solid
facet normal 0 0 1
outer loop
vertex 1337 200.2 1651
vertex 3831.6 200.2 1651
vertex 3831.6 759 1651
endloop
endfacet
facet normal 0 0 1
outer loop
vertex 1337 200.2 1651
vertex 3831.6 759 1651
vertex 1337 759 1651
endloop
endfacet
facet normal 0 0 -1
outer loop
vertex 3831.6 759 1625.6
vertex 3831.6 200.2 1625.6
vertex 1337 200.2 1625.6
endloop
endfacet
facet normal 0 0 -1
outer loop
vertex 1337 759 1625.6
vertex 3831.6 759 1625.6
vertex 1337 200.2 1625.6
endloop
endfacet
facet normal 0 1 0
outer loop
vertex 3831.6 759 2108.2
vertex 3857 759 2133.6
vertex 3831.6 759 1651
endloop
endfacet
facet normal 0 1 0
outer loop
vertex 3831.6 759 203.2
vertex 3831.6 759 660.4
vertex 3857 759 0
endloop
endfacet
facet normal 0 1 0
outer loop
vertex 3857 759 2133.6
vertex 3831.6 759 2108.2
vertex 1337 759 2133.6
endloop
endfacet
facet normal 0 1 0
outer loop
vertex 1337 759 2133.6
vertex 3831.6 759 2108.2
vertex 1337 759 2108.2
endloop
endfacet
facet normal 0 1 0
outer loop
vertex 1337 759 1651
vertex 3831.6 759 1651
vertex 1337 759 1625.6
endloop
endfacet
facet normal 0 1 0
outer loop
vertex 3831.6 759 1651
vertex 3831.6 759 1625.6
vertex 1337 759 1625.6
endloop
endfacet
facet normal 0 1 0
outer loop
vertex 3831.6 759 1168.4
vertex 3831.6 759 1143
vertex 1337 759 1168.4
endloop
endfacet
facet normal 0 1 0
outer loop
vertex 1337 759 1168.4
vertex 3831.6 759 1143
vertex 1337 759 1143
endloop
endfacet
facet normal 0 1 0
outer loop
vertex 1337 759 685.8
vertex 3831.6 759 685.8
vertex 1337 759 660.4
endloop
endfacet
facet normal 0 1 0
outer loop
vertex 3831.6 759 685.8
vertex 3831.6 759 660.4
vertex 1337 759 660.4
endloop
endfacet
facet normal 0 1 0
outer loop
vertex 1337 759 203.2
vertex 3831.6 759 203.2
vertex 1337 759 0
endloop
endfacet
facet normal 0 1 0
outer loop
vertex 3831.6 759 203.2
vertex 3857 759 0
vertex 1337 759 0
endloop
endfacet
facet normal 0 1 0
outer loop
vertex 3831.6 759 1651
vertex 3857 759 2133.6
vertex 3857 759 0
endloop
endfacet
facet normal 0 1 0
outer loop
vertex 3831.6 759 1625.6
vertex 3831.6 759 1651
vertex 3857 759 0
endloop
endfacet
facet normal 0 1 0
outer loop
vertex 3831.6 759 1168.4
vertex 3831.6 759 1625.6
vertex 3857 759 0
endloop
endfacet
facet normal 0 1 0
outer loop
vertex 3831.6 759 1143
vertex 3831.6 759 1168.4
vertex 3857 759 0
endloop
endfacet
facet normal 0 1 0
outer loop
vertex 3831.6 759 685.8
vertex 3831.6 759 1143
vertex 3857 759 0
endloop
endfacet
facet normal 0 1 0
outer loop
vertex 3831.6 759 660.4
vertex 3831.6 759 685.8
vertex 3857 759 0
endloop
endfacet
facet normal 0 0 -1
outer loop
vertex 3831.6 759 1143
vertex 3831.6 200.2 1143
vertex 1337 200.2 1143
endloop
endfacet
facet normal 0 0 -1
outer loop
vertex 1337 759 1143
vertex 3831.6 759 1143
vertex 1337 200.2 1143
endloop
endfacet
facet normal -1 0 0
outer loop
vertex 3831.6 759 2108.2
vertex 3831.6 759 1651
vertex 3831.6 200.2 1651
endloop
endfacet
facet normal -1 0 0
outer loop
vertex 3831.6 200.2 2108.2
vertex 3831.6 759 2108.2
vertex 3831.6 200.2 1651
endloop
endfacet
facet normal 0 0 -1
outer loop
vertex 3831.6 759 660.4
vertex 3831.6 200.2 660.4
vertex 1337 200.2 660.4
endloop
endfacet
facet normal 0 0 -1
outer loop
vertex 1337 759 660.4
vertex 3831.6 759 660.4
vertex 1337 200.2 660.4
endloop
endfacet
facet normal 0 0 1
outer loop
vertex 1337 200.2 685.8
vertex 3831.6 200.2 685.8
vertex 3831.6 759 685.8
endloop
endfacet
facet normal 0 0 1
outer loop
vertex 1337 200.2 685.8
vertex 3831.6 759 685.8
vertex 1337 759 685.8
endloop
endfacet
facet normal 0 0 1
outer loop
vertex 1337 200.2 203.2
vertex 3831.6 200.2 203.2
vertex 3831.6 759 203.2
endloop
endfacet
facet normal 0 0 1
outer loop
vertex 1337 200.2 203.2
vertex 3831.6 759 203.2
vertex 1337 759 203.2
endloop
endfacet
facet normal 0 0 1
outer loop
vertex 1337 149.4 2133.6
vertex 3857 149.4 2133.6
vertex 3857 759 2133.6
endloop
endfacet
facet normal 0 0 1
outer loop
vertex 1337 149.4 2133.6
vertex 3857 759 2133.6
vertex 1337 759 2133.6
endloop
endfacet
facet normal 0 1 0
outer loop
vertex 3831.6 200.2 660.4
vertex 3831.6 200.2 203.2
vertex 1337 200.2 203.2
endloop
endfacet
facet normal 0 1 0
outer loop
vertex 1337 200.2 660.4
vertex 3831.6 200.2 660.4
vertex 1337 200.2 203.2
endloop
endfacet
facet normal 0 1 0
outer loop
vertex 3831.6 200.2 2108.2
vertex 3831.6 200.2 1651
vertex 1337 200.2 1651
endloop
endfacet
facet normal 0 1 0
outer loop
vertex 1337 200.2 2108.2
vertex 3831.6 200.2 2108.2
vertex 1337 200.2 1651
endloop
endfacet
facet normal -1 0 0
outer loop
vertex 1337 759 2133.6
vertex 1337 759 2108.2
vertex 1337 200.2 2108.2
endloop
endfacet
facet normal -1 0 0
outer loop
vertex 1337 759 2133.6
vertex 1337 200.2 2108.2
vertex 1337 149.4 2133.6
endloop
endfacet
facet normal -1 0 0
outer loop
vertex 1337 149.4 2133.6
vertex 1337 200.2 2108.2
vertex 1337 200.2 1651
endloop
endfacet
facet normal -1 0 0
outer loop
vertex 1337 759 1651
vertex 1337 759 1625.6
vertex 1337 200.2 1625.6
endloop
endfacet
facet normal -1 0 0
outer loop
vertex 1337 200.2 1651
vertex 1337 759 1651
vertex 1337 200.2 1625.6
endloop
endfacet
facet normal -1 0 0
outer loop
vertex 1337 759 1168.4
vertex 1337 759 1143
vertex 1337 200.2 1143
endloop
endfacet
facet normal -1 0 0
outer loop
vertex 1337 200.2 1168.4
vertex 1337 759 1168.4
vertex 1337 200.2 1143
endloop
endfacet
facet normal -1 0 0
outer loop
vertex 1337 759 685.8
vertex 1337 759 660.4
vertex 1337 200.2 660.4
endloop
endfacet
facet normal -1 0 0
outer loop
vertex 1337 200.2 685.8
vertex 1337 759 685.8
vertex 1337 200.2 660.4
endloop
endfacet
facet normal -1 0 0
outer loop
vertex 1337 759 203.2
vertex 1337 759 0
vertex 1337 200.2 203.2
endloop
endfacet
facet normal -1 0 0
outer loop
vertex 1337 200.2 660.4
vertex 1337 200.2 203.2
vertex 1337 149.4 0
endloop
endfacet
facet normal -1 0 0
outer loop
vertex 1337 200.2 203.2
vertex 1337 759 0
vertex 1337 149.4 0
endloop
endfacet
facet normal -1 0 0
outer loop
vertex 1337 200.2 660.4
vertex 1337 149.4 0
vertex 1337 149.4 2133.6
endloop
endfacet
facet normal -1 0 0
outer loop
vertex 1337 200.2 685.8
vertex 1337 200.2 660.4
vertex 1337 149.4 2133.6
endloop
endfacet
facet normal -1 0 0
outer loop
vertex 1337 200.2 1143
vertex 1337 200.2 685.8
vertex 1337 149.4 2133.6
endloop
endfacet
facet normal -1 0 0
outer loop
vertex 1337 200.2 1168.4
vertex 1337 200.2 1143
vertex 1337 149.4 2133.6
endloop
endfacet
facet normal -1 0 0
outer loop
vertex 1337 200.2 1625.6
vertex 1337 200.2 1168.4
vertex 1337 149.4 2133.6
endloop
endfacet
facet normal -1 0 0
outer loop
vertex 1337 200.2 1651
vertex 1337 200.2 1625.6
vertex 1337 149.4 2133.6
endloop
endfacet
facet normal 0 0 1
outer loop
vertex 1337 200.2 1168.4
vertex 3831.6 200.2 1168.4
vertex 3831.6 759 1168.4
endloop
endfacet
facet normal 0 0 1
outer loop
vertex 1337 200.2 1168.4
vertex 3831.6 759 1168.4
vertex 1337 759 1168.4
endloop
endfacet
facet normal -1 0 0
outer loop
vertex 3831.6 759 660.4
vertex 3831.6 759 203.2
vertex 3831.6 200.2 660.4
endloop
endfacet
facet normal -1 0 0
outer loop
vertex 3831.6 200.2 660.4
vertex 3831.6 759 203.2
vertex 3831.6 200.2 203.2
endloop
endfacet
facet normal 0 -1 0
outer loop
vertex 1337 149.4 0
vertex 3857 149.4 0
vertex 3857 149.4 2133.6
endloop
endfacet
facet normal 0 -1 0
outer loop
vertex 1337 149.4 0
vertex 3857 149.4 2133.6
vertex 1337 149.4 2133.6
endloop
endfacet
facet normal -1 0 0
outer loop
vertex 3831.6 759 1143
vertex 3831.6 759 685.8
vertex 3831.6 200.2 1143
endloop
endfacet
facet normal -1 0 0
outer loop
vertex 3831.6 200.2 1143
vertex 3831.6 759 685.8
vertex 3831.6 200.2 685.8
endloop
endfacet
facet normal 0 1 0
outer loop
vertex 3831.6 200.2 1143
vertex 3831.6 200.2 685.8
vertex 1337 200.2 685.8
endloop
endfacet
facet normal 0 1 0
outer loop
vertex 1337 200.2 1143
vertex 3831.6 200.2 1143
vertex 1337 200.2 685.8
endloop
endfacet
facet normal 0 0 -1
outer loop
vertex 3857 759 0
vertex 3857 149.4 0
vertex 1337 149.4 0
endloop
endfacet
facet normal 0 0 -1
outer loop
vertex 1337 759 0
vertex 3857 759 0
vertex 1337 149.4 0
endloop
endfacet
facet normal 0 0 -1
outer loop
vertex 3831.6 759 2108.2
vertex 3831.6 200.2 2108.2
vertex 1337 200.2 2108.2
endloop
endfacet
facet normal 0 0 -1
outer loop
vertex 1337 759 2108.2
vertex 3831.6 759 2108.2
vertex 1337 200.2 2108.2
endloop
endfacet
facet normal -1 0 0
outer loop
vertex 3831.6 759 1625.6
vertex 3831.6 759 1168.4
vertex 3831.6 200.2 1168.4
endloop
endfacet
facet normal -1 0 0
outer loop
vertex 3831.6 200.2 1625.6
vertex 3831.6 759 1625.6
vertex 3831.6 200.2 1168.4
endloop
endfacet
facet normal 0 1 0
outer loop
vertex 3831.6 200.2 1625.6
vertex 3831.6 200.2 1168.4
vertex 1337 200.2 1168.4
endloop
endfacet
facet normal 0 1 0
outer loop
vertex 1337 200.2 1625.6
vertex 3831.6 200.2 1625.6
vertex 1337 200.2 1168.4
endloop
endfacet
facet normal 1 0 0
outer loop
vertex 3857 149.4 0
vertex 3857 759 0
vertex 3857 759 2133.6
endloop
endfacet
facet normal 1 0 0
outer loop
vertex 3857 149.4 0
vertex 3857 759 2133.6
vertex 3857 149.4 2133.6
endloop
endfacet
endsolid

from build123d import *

# Parameters (mm, degrees)
BOX004_W               = 2500
BOX004_H               = 558.8
BOX004_DEPTH           = 457.2
BOX003_W               = 2500
BOX003_H               = 558.8
BOX003_DEPTH           = 457.2
BOX002_W               = 2500
BOX002_H               = 558.8
BOX002_DEPTH           = 457.2
BOX001_W               = 2500
BOX001_H               = 558.8
BOX001_DEPTH           = 457.2
BOX_W                  = 2520
BOX_H                  = 609.6
BOX_DEPTH              = 2133.6
CUT003_PLACEMENT_ANGLE = 180


with BuildPart() as cube004:
    # Box004 → Box004 (new body)
    with BuildSketch(Plane(origin=(25.4, 0, 1651), x_dir=(1, 0, 0), z_dir=(0, 0, 1))):
        with Locations((1250, 279.4)):
            Rectangle(BOX004_W, BOX004_H)
    extrude(amount=BOX004_DEPTH)


with BuildPart() as cube003:
    # Box003 → Box003 (new body)
    with BuildSketch(Plane(origin=(25.4, 0, 685.8), x_dir=(1, 0, 0), z_dir=(0, 0, 1))):
        with Locations((1250, 279.4)):
            Rectangle(BOX003_W, BOX003_H)
    extrude(amount=BOX003_DEPTH)


with BuildPart() as cube002:
    # Box002 → Box002 (new body)
    with BuildSketch(Plane(origin=(25.4, 0, 203.2), x_dir=(1, 0, 0), z_dir=(0, 0, 1))):
        with Locations((1250, 279.4)):
            Rectangle(BOX002_W, BOX002_H)
    extrude(amount=BOX002_DEPTH)


with BuildPart() as cube001:
    # Box001 → Box001 (new body)
    with BuildSketch(Plane(origin=(25.4, 0, 1168.4), x_dir=(1, 0, 0), z_dir=(0, 0, 1))):
        with Locations((1250, 279.4)):
            Rectangle(BOX001_W, BOX001_H)
    extrude(amount=BOX001_DEPTH)


with BuildPart() as cut003:
    # Box → Box (new body)
    with BuildSketch(Plane.XY):
        with Locations((1260, 304.8)):
            Rectangle(BOX_W, BOX_H)
    extrude(amount=BOX_DEPTH)

    # Cut: cut Cube001
    add(cube001.part, mode=Mode.SUBTRACT)

    # Cut001: cut Cube002
    add(cube002.part, mode=Mode.SUBTRACT)

    # Cut002: cut Cube003
    add(cube003.part, mode=Mode.SUBTRACT)

    # Cut003: cut Cube004
    add(cube004.part, mode=Mode.SUBTRACT)


with BuildPart() as cut003_1:
    # Cut003 placement: moved
    add(cut003.part.moved(Location((3857, 759, 0))).rotate(Axis((3857, 759, 0), (0, 0, 1)), CUT003_PLACEMENT_ANGLE))


solid = cut003_1.part
